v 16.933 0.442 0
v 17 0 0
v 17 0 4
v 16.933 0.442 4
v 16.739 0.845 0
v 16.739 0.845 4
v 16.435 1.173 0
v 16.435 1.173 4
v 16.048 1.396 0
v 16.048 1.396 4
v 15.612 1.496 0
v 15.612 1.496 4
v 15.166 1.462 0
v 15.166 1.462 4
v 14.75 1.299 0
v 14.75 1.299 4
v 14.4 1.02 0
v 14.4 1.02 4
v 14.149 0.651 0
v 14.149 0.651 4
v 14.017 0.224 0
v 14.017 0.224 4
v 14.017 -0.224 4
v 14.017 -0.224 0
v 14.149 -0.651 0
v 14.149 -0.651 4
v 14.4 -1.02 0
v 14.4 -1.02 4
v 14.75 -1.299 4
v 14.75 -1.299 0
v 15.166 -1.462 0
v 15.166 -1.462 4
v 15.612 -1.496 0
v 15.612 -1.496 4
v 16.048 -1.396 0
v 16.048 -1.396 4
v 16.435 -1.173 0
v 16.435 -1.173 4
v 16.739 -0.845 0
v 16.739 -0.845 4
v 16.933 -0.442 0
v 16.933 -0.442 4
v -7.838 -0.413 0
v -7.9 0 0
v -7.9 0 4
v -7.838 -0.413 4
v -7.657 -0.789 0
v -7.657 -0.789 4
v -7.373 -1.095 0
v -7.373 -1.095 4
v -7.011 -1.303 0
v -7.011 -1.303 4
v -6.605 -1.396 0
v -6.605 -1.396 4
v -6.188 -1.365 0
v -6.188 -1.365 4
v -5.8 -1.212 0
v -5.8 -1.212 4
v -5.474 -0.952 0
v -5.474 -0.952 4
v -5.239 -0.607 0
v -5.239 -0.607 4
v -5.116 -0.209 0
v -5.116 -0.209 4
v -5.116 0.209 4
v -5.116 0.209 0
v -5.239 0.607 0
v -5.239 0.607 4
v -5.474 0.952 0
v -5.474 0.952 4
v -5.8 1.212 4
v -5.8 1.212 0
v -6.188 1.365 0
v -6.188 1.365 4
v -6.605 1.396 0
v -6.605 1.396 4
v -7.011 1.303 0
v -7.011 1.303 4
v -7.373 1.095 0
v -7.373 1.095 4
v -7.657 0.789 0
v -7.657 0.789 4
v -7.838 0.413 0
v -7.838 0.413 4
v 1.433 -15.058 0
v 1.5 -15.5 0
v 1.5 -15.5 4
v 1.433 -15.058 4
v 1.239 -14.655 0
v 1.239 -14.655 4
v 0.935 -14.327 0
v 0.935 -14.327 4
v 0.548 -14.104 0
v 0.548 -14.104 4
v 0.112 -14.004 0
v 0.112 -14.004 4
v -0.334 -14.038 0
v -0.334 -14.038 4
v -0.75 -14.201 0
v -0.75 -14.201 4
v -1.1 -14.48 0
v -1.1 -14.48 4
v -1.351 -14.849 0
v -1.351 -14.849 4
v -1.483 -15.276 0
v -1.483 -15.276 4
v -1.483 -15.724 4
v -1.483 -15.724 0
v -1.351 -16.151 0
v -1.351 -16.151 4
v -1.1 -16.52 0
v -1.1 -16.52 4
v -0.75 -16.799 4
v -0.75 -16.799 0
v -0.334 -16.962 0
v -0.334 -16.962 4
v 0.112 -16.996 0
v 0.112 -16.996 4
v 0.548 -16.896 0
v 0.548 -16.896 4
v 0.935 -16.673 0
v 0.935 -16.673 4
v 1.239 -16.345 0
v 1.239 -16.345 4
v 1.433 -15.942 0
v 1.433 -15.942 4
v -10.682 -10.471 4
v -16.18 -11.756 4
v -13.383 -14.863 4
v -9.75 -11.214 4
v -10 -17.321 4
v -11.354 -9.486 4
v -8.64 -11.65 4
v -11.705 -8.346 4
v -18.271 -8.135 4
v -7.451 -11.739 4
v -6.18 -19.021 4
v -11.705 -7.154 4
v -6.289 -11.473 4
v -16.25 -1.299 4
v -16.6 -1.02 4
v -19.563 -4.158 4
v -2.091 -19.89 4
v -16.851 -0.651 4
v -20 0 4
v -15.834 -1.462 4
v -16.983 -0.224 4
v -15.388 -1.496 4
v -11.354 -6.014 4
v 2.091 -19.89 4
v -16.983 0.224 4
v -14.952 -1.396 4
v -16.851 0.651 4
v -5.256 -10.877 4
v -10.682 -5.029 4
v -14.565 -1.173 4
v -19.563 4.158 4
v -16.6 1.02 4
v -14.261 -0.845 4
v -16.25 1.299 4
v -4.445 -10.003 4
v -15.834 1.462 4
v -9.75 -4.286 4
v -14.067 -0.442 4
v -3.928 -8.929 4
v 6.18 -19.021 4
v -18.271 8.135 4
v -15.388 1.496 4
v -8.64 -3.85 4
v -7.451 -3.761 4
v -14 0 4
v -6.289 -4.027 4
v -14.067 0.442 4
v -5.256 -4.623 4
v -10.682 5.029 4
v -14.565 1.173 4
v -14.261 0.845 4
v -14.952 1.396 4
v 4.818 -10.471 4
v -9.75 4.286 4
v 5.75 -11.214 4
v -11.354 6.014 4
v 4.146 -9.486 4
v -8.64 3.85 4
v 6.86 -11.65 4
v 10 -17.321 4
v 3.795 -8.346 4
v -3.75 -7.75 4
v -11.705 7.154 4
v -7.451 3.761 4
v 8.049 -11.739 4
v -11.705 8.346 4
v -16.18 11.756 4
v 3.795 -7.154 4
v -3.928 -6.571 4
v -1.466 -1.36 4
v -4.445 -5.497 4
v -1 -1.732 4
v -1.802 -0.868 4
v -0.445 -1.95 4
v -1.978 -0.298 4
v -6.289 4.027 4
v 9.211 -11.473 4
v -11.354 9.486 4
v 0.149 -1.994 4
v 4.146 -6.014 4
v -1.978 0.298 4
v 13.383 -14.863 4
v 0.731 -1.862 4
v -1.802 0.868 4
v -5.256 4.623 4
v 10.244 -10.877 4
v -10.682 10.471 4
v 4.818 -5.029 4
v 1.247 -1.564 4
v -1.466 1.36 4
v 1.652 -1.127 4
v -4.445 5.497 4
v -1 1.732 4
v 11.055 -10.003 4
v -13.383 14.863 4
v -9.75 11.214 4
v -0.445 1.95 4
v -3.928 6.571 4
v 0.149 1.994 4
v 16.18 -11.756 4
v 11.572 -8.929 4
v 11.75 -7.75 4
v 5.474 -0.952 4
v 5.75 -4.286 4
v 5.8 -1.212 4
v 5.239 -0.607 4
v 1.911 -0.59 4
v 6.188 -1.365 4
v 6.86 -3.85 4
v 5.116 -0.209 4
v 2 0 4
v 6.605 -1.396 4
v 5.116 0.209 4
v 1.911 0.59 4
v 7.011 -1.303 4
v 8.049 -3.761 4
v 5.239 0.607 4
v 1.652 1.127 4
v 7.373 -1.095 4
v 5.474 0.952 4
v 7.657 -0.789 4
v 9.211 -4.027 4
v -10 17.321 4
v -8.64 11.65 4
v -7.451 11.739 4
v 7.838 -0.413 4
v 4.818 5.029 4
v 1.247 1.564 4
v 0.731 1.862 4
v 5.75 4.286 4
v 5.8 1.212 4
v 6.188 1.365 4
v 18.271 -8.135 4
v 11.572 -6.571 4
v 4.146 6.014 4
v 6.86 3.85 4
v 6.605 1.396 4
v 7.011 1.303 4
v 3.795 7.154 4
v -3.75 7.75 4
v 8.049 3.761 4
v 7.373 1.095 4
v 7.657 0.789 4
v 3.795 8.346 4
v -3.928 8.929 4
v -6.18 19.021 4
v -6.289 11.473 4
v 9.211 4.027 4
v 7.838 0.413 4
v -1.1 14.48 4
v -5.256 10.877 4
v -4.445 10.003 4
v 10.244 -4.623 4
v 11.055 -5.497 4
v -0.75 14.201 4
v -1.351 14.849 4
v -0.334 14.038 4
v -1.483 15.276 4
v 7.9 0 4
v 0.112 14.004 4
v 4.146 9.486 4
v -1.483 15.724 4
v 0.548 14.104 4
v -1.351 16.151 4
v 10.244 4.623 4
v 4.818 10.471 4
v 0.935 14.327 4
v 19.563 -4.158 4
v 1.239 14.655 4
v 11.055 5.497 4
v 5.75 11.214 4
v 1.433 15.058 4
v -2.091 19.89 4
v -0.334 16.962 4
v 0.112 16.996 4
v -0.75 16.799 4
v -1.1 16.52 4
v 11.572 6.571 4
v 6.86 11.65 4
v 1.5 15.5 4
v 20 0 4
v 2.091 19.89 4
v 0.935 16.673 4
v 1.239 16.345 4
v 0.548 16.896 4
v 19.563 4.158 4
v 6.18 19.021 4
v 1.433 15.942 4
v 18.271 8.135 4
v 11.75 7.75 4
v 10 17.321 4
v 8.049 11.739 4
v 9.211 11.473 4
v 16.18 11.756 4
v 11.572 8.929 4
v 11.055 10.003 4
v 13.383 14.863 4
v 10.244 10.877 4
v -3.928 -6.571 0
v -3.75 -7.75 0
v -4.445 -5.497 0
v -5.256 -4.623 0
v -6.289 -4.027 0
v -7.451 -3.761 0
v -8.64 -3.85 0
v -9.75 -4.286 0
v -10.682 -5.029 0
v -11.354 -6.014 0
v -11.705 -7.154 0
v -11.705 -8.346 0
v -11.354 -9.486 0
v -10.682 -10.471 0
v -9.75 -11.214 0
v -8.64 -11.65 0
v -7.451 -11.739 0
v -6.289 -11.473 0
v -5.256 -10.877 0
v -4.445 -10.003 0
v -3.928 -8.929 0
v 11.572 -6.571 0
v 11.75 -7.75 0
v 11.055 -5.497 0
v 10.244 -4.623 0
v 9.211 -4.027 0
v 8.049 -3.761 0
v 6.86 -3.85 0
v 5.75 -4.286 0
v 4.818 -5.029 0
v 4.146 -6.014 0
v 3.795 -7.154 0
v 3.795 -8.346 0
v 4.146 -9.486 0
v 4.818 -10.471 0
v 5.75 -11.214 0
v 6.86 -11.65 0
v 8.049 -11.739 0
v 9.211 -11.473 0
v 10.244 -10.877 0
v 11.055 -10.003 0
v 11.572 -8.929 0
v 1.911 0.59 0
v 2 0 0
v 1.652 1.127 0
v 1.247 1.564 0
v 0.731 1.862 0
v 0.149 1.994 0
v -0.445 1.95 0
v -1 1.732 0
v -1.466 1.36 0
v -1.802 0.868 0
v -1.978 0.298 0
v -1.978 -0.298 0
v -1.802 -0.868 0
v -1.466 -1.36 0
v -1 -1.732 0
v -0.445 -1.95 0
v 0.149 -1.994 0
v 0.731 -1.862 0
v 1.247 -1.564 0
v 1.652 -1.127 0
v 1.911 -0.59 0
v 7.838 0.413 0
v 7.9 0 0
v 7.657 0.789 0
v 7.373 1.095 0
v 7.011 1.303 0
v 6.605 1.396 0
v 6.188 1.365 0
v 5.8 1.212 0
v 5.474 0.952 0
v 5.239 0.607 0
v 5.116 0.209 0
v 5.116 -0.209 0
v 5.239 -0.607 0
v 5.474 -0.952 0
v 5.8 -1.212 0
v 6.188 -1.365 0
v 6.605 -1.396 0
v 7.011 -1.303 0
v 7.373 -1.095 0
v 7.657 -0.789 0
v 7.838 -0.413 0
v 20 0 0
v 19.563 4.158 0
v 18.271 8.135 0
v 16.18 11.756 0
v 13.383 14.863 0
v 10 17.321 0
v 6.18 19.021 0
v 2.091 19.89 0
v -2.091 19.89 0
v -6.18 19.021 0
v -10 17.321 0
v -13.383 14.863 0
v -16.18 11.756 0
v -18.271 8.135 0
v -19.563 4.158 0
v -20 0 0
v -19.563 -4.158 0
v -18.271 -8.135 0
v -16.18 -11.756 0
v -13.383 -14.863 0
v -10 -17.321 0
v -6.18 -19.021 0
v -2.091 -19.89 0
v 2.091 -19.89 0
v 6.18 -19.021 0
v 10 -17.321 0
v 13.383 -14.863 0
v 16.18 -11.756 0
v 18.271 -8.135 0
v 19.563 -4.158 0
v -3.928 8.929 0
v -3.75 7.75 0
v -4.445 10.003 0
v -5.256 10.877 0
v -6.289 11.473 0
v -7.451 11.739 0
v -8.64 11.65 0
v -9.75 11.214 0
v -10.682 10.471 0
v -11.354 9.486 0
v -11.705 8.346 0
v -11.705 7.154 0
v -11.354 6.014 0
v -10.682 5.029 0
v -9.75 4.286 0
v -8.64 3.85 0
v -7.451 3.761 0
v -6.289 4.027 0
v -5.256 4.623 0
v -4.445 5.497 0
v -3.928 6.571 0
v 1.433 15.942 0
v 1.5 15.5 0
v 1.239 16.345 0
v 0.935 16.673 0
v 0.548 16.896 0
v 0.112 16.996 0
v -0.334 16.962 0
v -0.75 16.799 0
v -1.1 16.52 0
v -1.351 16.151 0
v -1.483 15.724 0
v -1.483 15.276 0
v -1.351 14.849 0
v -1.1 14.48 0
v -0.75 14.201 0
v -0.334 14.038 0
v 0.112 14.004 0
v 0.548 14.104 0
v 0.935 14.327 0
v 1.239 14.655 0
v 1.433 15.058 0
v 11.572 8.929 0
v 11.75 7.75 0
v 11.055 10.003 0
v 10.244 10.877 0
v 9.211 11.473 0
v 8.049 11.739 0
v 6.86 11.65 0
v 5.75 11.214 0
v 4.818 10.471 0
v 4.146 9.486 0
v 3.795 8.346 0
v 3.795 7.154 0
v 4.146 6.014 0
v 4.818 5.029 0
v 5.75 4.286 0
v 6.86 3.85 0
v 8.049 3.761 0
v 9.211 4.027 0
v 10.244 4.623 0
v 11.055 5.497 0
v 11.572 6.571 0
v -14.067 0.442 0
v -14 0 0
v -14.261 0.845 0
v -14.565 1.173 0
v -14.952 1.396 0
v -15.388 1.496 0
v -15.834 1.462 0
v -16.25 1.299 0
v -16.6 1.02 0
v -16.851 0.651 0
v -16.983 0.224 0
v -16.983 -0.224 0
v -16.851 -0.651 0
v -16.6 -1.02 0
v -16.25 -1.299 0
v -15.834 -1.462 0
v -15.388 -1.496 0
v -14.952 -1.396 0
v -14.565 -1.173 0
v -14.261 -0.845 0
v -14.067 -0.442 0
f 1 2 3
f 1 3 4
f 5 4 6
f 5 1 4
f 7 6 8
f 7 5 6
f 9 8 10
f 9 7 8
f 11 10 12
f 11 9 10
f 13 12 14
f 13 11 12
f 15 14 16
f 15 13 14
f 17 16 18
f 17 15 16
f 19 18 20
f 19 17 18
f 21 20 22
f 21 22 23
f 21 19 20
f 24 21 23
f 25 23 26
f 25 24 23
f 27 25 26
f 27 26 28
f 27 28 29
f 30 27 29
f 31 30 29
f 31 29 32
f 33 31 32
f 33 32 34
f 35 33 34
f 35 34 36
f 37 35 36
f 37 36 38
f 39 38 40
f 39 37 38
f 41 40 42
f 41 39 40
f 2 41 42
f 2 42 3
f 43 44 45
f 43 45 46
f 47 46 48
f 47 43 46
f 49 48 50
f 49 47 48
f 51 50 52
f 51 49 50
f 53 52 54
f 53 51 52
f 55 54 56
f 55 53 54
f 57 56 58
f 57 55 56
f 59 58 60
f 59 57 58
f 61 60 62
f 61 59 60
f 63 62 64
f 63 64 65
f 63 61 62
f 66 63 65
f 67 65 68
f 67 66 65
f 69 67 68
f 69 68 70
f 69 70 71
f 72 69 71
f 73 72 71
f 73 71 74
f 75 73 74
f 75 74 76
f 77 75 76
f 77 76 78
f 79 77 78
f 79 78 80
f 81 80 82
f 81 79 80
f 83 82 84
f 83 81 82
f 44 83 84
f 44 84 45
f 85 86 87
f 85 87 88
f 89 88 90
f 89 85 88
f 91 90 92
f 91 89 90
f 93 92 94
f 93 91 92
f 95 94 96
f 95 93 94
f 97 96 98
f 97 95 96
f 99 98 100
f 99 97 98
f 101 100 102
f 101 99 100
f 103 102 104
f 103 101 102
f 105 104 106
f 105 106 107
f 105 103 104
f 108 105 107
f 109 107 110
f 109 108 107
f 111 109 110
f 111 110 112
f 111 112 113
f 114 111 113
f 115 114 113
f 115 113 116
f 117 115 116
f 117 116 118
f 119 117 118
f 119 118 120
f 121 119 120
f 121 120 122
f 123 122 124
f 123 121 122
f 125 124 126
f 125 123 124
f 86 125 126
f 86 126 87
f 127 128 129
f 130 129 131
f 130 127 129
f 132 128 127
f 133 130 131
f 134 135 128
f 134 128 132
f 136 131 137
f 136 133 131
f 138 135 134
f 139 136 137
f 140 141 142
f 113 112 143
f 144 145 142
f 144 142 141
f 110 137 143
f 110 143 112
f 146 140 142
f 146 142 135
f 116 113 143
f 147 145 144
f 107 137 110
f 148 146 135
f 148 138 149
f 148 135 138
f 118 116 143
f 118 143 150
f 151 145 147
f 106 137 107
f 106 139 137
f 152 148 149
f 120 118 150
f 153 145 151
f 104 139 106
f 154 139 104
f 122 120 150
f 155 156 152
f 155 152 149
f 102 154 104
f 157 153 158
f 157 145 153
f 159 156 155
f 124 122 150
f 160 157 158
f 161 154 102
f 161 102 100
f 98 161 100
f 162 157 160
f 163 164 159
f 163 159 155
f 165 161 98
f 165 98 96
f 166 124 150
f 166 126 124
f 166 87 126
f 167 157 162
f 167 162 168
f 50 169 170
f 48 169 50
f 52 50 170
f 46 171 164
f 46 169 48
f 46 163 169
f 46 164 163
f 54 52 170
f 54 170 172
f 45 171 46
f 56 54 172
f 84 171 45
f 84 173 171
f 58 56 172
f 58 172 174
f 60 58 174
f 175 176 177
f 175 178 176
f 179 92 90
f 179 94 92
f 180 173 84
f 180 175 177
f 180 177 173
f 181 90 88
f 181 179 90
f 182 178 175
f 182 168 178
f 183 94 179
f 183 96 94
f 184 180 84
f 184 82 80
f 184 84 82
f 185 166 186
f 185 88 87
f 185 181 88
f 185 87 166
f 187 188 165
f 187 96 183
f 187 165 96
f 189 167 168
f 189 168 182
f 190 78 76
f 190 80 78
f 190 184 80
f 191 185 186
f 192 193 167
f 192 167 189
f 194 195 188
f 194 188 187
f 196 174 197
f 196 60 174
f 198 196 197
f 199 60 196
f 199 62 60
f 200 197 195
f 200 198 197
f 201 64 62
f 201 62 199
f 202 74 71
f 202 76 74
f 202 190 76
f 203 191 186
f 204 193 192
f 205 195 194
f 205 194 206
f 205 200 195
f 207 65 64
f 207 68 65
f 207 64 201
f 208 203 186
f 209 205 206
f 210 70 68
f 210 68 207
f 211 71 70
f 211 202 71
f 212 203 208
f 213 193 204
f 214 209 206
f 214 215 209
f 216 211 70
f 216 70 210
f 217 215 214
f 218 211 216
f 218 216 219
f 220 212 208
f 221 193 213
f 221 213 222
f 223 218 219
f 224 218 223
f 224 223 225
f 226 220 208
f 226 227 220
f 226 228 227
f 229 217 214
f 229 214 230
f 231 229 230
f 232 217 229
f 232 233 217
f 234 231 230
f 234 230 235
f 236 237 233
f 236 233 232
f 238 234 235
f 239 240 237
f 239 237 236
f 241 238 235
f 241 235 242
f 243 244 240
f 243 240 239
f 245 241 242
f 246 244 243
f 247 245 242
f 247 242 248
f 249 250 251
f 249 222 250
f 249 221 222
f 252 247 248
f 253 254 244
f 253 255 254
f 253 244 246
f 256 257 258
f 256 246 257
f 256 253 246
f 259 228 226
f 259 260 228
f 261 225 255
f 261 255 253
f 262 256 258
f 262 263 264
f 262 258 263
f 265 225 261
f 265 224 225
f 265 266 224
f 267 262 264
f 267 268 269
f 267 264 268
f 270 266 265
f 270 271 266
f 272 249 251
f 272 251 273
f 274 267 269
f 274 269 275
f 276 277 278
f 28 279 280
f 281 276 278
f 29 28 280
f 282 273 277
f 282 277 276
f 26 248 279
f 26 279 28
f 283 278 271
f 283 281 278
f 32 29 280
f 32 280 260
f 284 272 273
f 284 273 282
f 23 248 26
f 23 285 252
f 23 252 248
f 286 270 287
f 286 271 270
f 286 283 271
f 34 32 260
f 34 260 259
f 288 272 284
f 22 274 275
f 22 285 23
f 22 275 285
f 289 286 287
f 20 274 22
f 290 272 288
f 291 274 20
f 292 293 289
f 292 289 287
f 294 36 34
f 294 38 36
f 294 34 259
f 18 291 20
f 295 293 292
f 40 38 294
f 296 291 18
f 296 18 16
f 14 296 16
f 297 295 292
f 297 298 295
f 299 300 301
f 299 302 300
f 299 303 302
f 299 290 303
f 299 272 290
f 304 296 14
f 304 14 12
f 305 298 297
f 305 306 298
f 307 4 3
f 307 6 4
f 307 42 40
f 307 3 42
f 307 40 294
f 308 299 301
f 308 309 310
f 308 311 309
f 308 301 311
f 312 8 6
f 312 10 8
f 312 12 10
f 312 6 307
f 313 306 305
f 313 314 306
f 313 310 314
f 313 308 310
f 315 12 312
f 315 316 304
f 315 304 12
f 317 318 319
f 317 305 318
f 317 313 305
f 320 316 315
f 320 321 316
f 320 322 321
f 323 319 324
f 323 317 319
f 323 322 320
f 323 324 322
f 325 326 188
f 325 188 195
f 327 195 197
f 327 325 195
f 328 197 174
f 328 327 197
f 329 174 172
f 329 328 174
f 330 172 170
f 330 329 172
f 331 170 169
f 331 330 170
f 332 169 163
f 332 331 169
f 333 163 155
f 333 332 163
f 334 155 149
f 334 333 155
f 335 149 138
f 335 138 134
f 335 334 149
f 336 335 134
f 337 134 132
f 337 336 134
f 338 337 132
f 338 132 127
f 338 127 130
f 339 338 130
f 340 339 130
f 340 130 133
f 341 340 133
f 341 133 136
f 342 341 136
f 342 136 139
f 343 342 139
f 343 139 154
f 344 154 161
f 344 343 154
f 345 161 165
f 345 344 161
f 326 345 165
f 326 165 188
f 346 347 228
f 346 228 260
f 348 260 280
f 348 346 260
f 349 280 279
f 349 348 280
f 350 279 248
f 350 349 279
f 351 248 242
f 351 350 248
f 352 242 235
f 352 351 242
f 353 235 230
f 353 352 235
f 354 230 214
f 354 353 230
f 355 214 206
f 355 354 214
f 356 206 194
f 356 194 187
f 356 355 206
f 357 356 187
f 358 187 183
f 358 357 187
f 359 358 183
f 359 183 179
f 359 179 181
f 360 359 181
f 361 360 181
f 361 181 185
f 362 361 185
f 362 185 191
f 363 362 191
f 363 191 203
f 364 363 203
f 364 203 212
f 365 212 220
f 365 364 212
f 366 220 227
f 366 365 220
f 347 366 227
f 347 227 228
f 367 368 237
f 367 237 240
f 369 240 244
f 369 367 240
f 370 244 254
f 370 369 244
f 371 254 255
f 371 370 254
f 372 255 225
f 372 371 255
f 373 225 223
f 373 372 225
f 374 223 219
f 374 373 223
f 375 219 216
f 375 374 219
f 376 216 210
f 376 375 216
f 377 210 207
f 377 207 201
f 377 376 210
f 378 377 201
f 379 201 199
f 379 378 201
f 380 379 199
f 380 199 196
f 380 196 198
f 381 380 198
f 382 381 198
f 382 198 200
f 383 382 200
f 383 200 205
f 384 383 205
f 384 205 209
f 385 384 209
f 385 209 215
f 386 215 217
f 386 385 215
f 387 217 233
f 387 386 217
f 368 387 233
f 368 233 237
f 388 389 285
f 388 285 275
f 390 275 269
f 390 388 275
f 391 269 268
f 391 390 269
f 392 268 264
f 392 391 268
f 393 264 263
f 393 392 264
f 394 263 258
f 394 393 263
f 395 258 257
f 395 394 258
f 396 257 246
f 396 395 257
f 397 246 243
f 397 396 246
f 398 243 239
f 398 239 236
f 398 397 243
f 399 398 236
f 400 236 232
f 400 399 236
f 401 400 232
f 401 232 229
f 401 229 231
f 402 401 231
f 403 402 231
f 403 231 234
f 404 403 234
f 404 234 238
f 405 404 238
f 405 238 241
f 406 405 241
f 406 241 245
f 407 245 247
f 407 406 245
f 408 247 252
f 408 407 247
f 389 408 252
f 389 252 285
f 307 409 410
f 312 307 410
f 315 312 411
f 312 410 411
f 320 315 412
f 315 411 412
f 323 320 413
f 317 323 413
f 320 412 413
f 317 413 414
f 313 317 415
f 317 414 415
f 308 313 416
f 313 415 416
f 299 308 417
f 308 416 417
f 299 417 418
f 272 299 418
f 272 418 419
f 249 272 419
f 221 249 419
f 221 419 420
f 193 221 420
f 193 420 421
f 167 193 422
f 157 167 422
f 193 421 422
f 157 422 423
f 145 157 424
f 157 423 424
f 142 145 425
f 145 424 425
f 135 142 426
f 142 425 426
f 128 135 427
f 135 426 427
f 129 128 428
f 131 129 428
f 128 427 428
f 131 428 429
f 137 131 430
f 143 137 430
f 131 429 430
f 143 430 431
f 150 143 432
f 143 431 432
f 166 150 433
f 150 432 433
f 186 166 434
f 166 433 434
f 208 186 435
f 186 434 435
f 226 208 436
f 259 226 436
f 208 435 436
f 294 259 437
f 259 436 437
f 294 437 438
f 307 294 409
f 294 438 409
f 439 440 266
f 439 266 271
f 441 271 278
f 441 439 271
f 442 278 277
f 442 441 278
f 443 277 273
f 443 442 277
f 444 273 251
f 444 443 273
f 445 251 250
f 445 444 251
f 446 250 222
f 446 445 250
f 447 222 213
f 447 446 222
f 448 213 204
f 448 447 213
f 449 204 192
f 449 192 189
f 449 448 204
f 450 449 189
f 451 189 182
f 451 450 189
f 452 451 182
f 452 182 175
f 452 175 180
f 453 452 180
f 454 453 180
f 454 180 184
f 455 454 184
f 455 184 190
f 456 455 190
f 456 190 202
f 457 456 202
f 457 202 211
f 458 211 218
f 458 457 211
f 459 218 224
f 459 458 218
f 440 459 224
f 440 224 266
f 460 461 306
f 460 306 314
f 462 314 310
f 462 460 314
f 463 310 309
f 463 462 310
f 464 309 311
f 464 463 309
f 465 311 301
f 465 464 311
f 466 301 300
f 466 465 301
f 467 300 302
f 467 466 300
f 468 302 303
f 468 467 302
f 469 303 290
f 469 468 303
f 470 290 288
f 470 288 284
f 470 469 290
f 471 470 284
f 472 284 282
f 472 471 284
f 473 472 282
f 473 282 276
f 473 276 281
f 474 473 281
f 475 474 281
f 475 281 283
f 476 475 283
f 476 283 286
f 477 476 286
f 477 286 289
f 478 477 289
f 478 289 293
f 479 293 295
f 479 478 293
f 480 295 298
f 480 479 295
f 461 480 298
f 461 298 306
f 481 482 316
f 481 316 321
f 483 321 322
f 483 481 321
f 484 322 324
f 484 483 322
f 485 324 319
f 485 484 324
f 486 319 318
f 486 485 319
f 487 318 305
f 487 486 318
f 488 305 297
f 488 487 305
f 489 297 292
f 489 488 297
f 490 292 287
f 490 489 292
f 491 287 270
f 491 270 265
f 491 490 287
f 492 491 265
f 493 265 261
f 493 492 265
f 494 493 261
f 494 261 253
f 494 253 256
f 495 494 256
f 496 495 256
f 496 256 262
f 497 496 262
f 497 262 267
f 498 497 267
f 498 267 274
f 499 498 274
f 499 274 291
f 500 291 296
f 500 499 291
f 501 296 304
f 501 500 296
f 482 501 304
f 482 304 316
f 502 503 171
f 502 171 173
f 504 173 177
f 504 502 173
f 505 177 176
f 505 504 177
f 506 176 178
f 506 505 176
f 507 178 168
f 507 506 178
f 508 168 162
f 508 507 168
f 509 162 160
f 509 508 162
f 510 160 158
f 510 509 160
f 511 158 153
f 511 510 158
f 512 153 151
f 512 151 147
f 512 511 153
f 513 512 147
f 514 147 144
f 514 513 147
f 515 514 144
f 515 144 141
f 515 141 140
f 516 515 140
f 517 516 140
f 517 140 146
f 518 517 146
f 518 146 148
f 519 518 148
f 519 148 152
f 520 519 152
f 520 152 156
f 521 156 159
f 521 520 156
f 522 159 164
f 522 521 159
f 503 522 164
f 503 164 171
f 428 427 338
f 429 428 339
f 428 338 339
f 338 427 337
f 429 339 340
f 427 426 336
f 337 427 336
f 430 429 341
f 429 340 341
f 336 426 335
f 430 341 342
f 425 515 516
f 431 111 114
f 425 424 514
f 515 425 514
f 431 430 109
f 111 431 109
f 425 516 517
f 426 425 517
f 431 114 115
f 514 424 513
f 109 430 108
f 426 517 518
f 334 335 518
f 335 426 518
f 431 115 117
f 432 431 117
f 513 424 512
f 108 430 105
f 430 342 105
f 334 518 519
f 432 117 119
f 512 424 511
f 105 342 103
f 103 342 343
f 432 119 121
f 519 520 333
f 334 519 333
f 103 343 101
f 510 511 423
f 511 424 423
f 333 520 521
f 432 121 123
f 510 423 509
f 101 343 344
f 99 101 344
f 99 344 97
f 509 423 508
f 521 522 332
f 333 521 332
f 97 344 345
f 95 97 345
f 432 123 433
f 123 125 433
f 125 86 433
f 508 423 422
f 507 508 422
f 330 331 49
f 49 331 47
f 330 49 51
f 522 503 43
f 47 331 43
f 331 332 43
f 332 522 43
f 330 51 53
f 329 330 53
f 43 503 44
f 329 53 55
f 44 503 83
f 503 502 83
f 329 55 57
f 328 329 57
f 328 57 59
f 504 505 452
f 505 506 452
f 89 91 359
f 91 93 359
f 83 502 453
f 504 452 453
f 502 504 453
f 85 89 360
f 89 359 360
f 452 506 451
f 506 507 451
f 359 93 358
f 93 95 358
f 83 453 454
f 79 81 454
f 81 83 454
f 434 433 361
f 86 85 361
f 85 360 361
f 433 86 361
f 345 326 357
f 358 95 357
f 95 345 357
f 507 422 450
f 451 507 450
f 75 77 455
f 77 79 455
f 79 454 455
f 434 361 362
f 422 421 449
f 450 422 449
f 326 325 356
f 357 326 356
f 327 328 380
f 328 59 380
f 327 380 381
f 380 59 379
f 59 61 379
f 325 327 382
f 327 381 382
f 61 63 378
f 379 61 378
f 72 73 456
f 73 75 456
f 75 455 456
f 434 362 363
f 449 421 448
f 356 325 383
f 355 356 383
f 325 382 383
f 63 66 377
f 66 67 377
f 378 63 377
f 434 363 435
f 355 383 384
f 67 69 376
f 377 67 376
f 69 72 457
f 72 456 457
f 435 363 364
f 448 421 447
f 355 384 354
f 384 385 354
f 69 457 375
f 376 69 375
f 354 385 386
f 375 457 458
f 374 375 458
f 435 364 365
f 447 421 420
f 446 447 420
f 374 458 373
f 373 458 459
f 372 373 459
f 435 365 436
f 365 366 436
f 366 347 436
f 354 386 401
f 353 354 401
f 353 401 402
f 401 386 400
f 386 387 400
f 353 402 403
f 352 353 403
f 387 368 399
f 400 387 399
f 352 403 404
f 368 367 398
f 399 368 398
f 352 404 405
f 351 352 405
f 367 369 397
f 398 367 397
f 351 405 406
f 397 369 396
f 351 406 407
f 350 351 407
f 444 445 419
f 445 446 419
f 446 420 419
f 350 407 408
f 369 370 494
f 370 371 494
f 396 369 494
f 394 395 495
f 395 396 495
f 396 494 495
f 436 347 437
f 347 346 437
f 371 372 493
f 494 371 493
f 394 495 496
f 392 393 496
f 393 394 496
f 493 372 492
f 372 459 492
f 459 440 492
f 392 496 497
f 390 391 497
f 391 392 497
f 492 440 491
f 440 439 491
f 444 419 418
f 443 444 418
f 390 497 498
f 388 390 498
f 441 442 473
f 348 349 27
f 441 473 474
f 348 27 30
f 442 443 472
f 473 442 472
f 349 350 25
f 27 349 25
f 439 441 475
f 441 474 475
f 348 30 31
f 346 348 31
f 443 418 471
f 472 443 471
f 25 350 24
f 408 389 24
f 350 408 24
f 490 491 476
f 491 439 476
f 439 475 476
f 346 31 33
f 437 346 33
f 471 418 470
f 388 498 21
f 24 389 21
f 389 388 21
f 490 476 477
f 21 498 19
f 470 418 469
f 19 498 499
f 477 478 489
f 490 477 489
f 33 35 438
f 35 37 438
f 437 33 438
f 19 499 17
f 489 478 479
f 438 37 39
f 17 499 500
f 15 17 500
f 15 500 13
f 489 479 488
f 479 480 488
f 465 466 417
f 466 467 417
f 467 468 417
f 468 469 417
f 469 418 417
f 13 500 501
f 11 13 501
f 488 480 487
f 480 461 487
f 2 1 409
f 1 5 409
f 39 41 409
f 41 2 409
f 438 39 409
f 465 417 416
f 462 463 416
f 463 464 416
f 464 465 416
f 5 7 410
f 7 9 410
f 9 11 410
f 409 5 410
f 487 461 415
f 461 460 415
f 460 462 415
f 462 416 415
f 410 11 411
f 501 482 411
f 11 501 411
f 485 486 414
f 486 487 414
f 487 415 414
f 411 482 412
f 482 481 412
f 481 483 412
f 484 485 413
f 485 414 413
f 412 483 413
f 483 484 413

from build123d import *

# Parameters (mm, degrees)
SKETCH_1_R      = 20
SKETCH_1_R_2    = 2
SKETCH_1_R_3    = 1.4
SKETCH_1_R_4    = 1.5
SKETCH_1_R_5    = 4
EXTRUDE_1_DEPTH = 4


with BuildPart() as part:
    # 草图1 → 凸台-拉伸1 (new body)
    with BuildSketch(Plane.XY):
        Circle(SKETCH_1_R)
        Circle(SKETCH_1_R_2, mode=Mode.SUBTRACT)
        with Locations((6.5, 0)):
            Circle(SKETCH_1_R_3, mode=Mode.SUBTRACT)
        with Locations((0, -15.5)):
            Circle(SKETCH_1_R_4, mode=Mode.SUBTRACT)
        with Locations((-15.5, 0)):
            Circle(SKETCH_1_R_4, mode=Mode.SUBTRACT)
        with Locations((0, 15.5)):
            Circle(SKETCH_1_R_4, mode=Mode.SUBTRACT)
        with Locations((15.5, 0)):
            Circle(SKETCH_1_R_4, mode=Mode.SUBTRACT)
        with Locations(Location((-6.5, 0, 0), (0, 0, 180))):
            Circle(SKETCH_1_R_3, mode=Mode.SUBTRACT)
        with Locations((-7.75, 7.75)):
            Circle(SKETCH_1_R_5, mode=Mode.SUBTRACT)
        with Locations((7.75, 7.75)):
            Circle(SKETCH_1_R_5, mode=Mode.SUBTRACT)
        with Locations((7.75, -7.75)):
            Circle(SKETCH_1_R_5, mode=Mode.SUBTRACT)
        with Locations((-7.75, -7.75)):
            Circle(SKETCH_1_R_5, mode=Mode.SUBTRACT)
    extrude(amount=EXTRUDE_1_DEPTH)


solid = part.part
